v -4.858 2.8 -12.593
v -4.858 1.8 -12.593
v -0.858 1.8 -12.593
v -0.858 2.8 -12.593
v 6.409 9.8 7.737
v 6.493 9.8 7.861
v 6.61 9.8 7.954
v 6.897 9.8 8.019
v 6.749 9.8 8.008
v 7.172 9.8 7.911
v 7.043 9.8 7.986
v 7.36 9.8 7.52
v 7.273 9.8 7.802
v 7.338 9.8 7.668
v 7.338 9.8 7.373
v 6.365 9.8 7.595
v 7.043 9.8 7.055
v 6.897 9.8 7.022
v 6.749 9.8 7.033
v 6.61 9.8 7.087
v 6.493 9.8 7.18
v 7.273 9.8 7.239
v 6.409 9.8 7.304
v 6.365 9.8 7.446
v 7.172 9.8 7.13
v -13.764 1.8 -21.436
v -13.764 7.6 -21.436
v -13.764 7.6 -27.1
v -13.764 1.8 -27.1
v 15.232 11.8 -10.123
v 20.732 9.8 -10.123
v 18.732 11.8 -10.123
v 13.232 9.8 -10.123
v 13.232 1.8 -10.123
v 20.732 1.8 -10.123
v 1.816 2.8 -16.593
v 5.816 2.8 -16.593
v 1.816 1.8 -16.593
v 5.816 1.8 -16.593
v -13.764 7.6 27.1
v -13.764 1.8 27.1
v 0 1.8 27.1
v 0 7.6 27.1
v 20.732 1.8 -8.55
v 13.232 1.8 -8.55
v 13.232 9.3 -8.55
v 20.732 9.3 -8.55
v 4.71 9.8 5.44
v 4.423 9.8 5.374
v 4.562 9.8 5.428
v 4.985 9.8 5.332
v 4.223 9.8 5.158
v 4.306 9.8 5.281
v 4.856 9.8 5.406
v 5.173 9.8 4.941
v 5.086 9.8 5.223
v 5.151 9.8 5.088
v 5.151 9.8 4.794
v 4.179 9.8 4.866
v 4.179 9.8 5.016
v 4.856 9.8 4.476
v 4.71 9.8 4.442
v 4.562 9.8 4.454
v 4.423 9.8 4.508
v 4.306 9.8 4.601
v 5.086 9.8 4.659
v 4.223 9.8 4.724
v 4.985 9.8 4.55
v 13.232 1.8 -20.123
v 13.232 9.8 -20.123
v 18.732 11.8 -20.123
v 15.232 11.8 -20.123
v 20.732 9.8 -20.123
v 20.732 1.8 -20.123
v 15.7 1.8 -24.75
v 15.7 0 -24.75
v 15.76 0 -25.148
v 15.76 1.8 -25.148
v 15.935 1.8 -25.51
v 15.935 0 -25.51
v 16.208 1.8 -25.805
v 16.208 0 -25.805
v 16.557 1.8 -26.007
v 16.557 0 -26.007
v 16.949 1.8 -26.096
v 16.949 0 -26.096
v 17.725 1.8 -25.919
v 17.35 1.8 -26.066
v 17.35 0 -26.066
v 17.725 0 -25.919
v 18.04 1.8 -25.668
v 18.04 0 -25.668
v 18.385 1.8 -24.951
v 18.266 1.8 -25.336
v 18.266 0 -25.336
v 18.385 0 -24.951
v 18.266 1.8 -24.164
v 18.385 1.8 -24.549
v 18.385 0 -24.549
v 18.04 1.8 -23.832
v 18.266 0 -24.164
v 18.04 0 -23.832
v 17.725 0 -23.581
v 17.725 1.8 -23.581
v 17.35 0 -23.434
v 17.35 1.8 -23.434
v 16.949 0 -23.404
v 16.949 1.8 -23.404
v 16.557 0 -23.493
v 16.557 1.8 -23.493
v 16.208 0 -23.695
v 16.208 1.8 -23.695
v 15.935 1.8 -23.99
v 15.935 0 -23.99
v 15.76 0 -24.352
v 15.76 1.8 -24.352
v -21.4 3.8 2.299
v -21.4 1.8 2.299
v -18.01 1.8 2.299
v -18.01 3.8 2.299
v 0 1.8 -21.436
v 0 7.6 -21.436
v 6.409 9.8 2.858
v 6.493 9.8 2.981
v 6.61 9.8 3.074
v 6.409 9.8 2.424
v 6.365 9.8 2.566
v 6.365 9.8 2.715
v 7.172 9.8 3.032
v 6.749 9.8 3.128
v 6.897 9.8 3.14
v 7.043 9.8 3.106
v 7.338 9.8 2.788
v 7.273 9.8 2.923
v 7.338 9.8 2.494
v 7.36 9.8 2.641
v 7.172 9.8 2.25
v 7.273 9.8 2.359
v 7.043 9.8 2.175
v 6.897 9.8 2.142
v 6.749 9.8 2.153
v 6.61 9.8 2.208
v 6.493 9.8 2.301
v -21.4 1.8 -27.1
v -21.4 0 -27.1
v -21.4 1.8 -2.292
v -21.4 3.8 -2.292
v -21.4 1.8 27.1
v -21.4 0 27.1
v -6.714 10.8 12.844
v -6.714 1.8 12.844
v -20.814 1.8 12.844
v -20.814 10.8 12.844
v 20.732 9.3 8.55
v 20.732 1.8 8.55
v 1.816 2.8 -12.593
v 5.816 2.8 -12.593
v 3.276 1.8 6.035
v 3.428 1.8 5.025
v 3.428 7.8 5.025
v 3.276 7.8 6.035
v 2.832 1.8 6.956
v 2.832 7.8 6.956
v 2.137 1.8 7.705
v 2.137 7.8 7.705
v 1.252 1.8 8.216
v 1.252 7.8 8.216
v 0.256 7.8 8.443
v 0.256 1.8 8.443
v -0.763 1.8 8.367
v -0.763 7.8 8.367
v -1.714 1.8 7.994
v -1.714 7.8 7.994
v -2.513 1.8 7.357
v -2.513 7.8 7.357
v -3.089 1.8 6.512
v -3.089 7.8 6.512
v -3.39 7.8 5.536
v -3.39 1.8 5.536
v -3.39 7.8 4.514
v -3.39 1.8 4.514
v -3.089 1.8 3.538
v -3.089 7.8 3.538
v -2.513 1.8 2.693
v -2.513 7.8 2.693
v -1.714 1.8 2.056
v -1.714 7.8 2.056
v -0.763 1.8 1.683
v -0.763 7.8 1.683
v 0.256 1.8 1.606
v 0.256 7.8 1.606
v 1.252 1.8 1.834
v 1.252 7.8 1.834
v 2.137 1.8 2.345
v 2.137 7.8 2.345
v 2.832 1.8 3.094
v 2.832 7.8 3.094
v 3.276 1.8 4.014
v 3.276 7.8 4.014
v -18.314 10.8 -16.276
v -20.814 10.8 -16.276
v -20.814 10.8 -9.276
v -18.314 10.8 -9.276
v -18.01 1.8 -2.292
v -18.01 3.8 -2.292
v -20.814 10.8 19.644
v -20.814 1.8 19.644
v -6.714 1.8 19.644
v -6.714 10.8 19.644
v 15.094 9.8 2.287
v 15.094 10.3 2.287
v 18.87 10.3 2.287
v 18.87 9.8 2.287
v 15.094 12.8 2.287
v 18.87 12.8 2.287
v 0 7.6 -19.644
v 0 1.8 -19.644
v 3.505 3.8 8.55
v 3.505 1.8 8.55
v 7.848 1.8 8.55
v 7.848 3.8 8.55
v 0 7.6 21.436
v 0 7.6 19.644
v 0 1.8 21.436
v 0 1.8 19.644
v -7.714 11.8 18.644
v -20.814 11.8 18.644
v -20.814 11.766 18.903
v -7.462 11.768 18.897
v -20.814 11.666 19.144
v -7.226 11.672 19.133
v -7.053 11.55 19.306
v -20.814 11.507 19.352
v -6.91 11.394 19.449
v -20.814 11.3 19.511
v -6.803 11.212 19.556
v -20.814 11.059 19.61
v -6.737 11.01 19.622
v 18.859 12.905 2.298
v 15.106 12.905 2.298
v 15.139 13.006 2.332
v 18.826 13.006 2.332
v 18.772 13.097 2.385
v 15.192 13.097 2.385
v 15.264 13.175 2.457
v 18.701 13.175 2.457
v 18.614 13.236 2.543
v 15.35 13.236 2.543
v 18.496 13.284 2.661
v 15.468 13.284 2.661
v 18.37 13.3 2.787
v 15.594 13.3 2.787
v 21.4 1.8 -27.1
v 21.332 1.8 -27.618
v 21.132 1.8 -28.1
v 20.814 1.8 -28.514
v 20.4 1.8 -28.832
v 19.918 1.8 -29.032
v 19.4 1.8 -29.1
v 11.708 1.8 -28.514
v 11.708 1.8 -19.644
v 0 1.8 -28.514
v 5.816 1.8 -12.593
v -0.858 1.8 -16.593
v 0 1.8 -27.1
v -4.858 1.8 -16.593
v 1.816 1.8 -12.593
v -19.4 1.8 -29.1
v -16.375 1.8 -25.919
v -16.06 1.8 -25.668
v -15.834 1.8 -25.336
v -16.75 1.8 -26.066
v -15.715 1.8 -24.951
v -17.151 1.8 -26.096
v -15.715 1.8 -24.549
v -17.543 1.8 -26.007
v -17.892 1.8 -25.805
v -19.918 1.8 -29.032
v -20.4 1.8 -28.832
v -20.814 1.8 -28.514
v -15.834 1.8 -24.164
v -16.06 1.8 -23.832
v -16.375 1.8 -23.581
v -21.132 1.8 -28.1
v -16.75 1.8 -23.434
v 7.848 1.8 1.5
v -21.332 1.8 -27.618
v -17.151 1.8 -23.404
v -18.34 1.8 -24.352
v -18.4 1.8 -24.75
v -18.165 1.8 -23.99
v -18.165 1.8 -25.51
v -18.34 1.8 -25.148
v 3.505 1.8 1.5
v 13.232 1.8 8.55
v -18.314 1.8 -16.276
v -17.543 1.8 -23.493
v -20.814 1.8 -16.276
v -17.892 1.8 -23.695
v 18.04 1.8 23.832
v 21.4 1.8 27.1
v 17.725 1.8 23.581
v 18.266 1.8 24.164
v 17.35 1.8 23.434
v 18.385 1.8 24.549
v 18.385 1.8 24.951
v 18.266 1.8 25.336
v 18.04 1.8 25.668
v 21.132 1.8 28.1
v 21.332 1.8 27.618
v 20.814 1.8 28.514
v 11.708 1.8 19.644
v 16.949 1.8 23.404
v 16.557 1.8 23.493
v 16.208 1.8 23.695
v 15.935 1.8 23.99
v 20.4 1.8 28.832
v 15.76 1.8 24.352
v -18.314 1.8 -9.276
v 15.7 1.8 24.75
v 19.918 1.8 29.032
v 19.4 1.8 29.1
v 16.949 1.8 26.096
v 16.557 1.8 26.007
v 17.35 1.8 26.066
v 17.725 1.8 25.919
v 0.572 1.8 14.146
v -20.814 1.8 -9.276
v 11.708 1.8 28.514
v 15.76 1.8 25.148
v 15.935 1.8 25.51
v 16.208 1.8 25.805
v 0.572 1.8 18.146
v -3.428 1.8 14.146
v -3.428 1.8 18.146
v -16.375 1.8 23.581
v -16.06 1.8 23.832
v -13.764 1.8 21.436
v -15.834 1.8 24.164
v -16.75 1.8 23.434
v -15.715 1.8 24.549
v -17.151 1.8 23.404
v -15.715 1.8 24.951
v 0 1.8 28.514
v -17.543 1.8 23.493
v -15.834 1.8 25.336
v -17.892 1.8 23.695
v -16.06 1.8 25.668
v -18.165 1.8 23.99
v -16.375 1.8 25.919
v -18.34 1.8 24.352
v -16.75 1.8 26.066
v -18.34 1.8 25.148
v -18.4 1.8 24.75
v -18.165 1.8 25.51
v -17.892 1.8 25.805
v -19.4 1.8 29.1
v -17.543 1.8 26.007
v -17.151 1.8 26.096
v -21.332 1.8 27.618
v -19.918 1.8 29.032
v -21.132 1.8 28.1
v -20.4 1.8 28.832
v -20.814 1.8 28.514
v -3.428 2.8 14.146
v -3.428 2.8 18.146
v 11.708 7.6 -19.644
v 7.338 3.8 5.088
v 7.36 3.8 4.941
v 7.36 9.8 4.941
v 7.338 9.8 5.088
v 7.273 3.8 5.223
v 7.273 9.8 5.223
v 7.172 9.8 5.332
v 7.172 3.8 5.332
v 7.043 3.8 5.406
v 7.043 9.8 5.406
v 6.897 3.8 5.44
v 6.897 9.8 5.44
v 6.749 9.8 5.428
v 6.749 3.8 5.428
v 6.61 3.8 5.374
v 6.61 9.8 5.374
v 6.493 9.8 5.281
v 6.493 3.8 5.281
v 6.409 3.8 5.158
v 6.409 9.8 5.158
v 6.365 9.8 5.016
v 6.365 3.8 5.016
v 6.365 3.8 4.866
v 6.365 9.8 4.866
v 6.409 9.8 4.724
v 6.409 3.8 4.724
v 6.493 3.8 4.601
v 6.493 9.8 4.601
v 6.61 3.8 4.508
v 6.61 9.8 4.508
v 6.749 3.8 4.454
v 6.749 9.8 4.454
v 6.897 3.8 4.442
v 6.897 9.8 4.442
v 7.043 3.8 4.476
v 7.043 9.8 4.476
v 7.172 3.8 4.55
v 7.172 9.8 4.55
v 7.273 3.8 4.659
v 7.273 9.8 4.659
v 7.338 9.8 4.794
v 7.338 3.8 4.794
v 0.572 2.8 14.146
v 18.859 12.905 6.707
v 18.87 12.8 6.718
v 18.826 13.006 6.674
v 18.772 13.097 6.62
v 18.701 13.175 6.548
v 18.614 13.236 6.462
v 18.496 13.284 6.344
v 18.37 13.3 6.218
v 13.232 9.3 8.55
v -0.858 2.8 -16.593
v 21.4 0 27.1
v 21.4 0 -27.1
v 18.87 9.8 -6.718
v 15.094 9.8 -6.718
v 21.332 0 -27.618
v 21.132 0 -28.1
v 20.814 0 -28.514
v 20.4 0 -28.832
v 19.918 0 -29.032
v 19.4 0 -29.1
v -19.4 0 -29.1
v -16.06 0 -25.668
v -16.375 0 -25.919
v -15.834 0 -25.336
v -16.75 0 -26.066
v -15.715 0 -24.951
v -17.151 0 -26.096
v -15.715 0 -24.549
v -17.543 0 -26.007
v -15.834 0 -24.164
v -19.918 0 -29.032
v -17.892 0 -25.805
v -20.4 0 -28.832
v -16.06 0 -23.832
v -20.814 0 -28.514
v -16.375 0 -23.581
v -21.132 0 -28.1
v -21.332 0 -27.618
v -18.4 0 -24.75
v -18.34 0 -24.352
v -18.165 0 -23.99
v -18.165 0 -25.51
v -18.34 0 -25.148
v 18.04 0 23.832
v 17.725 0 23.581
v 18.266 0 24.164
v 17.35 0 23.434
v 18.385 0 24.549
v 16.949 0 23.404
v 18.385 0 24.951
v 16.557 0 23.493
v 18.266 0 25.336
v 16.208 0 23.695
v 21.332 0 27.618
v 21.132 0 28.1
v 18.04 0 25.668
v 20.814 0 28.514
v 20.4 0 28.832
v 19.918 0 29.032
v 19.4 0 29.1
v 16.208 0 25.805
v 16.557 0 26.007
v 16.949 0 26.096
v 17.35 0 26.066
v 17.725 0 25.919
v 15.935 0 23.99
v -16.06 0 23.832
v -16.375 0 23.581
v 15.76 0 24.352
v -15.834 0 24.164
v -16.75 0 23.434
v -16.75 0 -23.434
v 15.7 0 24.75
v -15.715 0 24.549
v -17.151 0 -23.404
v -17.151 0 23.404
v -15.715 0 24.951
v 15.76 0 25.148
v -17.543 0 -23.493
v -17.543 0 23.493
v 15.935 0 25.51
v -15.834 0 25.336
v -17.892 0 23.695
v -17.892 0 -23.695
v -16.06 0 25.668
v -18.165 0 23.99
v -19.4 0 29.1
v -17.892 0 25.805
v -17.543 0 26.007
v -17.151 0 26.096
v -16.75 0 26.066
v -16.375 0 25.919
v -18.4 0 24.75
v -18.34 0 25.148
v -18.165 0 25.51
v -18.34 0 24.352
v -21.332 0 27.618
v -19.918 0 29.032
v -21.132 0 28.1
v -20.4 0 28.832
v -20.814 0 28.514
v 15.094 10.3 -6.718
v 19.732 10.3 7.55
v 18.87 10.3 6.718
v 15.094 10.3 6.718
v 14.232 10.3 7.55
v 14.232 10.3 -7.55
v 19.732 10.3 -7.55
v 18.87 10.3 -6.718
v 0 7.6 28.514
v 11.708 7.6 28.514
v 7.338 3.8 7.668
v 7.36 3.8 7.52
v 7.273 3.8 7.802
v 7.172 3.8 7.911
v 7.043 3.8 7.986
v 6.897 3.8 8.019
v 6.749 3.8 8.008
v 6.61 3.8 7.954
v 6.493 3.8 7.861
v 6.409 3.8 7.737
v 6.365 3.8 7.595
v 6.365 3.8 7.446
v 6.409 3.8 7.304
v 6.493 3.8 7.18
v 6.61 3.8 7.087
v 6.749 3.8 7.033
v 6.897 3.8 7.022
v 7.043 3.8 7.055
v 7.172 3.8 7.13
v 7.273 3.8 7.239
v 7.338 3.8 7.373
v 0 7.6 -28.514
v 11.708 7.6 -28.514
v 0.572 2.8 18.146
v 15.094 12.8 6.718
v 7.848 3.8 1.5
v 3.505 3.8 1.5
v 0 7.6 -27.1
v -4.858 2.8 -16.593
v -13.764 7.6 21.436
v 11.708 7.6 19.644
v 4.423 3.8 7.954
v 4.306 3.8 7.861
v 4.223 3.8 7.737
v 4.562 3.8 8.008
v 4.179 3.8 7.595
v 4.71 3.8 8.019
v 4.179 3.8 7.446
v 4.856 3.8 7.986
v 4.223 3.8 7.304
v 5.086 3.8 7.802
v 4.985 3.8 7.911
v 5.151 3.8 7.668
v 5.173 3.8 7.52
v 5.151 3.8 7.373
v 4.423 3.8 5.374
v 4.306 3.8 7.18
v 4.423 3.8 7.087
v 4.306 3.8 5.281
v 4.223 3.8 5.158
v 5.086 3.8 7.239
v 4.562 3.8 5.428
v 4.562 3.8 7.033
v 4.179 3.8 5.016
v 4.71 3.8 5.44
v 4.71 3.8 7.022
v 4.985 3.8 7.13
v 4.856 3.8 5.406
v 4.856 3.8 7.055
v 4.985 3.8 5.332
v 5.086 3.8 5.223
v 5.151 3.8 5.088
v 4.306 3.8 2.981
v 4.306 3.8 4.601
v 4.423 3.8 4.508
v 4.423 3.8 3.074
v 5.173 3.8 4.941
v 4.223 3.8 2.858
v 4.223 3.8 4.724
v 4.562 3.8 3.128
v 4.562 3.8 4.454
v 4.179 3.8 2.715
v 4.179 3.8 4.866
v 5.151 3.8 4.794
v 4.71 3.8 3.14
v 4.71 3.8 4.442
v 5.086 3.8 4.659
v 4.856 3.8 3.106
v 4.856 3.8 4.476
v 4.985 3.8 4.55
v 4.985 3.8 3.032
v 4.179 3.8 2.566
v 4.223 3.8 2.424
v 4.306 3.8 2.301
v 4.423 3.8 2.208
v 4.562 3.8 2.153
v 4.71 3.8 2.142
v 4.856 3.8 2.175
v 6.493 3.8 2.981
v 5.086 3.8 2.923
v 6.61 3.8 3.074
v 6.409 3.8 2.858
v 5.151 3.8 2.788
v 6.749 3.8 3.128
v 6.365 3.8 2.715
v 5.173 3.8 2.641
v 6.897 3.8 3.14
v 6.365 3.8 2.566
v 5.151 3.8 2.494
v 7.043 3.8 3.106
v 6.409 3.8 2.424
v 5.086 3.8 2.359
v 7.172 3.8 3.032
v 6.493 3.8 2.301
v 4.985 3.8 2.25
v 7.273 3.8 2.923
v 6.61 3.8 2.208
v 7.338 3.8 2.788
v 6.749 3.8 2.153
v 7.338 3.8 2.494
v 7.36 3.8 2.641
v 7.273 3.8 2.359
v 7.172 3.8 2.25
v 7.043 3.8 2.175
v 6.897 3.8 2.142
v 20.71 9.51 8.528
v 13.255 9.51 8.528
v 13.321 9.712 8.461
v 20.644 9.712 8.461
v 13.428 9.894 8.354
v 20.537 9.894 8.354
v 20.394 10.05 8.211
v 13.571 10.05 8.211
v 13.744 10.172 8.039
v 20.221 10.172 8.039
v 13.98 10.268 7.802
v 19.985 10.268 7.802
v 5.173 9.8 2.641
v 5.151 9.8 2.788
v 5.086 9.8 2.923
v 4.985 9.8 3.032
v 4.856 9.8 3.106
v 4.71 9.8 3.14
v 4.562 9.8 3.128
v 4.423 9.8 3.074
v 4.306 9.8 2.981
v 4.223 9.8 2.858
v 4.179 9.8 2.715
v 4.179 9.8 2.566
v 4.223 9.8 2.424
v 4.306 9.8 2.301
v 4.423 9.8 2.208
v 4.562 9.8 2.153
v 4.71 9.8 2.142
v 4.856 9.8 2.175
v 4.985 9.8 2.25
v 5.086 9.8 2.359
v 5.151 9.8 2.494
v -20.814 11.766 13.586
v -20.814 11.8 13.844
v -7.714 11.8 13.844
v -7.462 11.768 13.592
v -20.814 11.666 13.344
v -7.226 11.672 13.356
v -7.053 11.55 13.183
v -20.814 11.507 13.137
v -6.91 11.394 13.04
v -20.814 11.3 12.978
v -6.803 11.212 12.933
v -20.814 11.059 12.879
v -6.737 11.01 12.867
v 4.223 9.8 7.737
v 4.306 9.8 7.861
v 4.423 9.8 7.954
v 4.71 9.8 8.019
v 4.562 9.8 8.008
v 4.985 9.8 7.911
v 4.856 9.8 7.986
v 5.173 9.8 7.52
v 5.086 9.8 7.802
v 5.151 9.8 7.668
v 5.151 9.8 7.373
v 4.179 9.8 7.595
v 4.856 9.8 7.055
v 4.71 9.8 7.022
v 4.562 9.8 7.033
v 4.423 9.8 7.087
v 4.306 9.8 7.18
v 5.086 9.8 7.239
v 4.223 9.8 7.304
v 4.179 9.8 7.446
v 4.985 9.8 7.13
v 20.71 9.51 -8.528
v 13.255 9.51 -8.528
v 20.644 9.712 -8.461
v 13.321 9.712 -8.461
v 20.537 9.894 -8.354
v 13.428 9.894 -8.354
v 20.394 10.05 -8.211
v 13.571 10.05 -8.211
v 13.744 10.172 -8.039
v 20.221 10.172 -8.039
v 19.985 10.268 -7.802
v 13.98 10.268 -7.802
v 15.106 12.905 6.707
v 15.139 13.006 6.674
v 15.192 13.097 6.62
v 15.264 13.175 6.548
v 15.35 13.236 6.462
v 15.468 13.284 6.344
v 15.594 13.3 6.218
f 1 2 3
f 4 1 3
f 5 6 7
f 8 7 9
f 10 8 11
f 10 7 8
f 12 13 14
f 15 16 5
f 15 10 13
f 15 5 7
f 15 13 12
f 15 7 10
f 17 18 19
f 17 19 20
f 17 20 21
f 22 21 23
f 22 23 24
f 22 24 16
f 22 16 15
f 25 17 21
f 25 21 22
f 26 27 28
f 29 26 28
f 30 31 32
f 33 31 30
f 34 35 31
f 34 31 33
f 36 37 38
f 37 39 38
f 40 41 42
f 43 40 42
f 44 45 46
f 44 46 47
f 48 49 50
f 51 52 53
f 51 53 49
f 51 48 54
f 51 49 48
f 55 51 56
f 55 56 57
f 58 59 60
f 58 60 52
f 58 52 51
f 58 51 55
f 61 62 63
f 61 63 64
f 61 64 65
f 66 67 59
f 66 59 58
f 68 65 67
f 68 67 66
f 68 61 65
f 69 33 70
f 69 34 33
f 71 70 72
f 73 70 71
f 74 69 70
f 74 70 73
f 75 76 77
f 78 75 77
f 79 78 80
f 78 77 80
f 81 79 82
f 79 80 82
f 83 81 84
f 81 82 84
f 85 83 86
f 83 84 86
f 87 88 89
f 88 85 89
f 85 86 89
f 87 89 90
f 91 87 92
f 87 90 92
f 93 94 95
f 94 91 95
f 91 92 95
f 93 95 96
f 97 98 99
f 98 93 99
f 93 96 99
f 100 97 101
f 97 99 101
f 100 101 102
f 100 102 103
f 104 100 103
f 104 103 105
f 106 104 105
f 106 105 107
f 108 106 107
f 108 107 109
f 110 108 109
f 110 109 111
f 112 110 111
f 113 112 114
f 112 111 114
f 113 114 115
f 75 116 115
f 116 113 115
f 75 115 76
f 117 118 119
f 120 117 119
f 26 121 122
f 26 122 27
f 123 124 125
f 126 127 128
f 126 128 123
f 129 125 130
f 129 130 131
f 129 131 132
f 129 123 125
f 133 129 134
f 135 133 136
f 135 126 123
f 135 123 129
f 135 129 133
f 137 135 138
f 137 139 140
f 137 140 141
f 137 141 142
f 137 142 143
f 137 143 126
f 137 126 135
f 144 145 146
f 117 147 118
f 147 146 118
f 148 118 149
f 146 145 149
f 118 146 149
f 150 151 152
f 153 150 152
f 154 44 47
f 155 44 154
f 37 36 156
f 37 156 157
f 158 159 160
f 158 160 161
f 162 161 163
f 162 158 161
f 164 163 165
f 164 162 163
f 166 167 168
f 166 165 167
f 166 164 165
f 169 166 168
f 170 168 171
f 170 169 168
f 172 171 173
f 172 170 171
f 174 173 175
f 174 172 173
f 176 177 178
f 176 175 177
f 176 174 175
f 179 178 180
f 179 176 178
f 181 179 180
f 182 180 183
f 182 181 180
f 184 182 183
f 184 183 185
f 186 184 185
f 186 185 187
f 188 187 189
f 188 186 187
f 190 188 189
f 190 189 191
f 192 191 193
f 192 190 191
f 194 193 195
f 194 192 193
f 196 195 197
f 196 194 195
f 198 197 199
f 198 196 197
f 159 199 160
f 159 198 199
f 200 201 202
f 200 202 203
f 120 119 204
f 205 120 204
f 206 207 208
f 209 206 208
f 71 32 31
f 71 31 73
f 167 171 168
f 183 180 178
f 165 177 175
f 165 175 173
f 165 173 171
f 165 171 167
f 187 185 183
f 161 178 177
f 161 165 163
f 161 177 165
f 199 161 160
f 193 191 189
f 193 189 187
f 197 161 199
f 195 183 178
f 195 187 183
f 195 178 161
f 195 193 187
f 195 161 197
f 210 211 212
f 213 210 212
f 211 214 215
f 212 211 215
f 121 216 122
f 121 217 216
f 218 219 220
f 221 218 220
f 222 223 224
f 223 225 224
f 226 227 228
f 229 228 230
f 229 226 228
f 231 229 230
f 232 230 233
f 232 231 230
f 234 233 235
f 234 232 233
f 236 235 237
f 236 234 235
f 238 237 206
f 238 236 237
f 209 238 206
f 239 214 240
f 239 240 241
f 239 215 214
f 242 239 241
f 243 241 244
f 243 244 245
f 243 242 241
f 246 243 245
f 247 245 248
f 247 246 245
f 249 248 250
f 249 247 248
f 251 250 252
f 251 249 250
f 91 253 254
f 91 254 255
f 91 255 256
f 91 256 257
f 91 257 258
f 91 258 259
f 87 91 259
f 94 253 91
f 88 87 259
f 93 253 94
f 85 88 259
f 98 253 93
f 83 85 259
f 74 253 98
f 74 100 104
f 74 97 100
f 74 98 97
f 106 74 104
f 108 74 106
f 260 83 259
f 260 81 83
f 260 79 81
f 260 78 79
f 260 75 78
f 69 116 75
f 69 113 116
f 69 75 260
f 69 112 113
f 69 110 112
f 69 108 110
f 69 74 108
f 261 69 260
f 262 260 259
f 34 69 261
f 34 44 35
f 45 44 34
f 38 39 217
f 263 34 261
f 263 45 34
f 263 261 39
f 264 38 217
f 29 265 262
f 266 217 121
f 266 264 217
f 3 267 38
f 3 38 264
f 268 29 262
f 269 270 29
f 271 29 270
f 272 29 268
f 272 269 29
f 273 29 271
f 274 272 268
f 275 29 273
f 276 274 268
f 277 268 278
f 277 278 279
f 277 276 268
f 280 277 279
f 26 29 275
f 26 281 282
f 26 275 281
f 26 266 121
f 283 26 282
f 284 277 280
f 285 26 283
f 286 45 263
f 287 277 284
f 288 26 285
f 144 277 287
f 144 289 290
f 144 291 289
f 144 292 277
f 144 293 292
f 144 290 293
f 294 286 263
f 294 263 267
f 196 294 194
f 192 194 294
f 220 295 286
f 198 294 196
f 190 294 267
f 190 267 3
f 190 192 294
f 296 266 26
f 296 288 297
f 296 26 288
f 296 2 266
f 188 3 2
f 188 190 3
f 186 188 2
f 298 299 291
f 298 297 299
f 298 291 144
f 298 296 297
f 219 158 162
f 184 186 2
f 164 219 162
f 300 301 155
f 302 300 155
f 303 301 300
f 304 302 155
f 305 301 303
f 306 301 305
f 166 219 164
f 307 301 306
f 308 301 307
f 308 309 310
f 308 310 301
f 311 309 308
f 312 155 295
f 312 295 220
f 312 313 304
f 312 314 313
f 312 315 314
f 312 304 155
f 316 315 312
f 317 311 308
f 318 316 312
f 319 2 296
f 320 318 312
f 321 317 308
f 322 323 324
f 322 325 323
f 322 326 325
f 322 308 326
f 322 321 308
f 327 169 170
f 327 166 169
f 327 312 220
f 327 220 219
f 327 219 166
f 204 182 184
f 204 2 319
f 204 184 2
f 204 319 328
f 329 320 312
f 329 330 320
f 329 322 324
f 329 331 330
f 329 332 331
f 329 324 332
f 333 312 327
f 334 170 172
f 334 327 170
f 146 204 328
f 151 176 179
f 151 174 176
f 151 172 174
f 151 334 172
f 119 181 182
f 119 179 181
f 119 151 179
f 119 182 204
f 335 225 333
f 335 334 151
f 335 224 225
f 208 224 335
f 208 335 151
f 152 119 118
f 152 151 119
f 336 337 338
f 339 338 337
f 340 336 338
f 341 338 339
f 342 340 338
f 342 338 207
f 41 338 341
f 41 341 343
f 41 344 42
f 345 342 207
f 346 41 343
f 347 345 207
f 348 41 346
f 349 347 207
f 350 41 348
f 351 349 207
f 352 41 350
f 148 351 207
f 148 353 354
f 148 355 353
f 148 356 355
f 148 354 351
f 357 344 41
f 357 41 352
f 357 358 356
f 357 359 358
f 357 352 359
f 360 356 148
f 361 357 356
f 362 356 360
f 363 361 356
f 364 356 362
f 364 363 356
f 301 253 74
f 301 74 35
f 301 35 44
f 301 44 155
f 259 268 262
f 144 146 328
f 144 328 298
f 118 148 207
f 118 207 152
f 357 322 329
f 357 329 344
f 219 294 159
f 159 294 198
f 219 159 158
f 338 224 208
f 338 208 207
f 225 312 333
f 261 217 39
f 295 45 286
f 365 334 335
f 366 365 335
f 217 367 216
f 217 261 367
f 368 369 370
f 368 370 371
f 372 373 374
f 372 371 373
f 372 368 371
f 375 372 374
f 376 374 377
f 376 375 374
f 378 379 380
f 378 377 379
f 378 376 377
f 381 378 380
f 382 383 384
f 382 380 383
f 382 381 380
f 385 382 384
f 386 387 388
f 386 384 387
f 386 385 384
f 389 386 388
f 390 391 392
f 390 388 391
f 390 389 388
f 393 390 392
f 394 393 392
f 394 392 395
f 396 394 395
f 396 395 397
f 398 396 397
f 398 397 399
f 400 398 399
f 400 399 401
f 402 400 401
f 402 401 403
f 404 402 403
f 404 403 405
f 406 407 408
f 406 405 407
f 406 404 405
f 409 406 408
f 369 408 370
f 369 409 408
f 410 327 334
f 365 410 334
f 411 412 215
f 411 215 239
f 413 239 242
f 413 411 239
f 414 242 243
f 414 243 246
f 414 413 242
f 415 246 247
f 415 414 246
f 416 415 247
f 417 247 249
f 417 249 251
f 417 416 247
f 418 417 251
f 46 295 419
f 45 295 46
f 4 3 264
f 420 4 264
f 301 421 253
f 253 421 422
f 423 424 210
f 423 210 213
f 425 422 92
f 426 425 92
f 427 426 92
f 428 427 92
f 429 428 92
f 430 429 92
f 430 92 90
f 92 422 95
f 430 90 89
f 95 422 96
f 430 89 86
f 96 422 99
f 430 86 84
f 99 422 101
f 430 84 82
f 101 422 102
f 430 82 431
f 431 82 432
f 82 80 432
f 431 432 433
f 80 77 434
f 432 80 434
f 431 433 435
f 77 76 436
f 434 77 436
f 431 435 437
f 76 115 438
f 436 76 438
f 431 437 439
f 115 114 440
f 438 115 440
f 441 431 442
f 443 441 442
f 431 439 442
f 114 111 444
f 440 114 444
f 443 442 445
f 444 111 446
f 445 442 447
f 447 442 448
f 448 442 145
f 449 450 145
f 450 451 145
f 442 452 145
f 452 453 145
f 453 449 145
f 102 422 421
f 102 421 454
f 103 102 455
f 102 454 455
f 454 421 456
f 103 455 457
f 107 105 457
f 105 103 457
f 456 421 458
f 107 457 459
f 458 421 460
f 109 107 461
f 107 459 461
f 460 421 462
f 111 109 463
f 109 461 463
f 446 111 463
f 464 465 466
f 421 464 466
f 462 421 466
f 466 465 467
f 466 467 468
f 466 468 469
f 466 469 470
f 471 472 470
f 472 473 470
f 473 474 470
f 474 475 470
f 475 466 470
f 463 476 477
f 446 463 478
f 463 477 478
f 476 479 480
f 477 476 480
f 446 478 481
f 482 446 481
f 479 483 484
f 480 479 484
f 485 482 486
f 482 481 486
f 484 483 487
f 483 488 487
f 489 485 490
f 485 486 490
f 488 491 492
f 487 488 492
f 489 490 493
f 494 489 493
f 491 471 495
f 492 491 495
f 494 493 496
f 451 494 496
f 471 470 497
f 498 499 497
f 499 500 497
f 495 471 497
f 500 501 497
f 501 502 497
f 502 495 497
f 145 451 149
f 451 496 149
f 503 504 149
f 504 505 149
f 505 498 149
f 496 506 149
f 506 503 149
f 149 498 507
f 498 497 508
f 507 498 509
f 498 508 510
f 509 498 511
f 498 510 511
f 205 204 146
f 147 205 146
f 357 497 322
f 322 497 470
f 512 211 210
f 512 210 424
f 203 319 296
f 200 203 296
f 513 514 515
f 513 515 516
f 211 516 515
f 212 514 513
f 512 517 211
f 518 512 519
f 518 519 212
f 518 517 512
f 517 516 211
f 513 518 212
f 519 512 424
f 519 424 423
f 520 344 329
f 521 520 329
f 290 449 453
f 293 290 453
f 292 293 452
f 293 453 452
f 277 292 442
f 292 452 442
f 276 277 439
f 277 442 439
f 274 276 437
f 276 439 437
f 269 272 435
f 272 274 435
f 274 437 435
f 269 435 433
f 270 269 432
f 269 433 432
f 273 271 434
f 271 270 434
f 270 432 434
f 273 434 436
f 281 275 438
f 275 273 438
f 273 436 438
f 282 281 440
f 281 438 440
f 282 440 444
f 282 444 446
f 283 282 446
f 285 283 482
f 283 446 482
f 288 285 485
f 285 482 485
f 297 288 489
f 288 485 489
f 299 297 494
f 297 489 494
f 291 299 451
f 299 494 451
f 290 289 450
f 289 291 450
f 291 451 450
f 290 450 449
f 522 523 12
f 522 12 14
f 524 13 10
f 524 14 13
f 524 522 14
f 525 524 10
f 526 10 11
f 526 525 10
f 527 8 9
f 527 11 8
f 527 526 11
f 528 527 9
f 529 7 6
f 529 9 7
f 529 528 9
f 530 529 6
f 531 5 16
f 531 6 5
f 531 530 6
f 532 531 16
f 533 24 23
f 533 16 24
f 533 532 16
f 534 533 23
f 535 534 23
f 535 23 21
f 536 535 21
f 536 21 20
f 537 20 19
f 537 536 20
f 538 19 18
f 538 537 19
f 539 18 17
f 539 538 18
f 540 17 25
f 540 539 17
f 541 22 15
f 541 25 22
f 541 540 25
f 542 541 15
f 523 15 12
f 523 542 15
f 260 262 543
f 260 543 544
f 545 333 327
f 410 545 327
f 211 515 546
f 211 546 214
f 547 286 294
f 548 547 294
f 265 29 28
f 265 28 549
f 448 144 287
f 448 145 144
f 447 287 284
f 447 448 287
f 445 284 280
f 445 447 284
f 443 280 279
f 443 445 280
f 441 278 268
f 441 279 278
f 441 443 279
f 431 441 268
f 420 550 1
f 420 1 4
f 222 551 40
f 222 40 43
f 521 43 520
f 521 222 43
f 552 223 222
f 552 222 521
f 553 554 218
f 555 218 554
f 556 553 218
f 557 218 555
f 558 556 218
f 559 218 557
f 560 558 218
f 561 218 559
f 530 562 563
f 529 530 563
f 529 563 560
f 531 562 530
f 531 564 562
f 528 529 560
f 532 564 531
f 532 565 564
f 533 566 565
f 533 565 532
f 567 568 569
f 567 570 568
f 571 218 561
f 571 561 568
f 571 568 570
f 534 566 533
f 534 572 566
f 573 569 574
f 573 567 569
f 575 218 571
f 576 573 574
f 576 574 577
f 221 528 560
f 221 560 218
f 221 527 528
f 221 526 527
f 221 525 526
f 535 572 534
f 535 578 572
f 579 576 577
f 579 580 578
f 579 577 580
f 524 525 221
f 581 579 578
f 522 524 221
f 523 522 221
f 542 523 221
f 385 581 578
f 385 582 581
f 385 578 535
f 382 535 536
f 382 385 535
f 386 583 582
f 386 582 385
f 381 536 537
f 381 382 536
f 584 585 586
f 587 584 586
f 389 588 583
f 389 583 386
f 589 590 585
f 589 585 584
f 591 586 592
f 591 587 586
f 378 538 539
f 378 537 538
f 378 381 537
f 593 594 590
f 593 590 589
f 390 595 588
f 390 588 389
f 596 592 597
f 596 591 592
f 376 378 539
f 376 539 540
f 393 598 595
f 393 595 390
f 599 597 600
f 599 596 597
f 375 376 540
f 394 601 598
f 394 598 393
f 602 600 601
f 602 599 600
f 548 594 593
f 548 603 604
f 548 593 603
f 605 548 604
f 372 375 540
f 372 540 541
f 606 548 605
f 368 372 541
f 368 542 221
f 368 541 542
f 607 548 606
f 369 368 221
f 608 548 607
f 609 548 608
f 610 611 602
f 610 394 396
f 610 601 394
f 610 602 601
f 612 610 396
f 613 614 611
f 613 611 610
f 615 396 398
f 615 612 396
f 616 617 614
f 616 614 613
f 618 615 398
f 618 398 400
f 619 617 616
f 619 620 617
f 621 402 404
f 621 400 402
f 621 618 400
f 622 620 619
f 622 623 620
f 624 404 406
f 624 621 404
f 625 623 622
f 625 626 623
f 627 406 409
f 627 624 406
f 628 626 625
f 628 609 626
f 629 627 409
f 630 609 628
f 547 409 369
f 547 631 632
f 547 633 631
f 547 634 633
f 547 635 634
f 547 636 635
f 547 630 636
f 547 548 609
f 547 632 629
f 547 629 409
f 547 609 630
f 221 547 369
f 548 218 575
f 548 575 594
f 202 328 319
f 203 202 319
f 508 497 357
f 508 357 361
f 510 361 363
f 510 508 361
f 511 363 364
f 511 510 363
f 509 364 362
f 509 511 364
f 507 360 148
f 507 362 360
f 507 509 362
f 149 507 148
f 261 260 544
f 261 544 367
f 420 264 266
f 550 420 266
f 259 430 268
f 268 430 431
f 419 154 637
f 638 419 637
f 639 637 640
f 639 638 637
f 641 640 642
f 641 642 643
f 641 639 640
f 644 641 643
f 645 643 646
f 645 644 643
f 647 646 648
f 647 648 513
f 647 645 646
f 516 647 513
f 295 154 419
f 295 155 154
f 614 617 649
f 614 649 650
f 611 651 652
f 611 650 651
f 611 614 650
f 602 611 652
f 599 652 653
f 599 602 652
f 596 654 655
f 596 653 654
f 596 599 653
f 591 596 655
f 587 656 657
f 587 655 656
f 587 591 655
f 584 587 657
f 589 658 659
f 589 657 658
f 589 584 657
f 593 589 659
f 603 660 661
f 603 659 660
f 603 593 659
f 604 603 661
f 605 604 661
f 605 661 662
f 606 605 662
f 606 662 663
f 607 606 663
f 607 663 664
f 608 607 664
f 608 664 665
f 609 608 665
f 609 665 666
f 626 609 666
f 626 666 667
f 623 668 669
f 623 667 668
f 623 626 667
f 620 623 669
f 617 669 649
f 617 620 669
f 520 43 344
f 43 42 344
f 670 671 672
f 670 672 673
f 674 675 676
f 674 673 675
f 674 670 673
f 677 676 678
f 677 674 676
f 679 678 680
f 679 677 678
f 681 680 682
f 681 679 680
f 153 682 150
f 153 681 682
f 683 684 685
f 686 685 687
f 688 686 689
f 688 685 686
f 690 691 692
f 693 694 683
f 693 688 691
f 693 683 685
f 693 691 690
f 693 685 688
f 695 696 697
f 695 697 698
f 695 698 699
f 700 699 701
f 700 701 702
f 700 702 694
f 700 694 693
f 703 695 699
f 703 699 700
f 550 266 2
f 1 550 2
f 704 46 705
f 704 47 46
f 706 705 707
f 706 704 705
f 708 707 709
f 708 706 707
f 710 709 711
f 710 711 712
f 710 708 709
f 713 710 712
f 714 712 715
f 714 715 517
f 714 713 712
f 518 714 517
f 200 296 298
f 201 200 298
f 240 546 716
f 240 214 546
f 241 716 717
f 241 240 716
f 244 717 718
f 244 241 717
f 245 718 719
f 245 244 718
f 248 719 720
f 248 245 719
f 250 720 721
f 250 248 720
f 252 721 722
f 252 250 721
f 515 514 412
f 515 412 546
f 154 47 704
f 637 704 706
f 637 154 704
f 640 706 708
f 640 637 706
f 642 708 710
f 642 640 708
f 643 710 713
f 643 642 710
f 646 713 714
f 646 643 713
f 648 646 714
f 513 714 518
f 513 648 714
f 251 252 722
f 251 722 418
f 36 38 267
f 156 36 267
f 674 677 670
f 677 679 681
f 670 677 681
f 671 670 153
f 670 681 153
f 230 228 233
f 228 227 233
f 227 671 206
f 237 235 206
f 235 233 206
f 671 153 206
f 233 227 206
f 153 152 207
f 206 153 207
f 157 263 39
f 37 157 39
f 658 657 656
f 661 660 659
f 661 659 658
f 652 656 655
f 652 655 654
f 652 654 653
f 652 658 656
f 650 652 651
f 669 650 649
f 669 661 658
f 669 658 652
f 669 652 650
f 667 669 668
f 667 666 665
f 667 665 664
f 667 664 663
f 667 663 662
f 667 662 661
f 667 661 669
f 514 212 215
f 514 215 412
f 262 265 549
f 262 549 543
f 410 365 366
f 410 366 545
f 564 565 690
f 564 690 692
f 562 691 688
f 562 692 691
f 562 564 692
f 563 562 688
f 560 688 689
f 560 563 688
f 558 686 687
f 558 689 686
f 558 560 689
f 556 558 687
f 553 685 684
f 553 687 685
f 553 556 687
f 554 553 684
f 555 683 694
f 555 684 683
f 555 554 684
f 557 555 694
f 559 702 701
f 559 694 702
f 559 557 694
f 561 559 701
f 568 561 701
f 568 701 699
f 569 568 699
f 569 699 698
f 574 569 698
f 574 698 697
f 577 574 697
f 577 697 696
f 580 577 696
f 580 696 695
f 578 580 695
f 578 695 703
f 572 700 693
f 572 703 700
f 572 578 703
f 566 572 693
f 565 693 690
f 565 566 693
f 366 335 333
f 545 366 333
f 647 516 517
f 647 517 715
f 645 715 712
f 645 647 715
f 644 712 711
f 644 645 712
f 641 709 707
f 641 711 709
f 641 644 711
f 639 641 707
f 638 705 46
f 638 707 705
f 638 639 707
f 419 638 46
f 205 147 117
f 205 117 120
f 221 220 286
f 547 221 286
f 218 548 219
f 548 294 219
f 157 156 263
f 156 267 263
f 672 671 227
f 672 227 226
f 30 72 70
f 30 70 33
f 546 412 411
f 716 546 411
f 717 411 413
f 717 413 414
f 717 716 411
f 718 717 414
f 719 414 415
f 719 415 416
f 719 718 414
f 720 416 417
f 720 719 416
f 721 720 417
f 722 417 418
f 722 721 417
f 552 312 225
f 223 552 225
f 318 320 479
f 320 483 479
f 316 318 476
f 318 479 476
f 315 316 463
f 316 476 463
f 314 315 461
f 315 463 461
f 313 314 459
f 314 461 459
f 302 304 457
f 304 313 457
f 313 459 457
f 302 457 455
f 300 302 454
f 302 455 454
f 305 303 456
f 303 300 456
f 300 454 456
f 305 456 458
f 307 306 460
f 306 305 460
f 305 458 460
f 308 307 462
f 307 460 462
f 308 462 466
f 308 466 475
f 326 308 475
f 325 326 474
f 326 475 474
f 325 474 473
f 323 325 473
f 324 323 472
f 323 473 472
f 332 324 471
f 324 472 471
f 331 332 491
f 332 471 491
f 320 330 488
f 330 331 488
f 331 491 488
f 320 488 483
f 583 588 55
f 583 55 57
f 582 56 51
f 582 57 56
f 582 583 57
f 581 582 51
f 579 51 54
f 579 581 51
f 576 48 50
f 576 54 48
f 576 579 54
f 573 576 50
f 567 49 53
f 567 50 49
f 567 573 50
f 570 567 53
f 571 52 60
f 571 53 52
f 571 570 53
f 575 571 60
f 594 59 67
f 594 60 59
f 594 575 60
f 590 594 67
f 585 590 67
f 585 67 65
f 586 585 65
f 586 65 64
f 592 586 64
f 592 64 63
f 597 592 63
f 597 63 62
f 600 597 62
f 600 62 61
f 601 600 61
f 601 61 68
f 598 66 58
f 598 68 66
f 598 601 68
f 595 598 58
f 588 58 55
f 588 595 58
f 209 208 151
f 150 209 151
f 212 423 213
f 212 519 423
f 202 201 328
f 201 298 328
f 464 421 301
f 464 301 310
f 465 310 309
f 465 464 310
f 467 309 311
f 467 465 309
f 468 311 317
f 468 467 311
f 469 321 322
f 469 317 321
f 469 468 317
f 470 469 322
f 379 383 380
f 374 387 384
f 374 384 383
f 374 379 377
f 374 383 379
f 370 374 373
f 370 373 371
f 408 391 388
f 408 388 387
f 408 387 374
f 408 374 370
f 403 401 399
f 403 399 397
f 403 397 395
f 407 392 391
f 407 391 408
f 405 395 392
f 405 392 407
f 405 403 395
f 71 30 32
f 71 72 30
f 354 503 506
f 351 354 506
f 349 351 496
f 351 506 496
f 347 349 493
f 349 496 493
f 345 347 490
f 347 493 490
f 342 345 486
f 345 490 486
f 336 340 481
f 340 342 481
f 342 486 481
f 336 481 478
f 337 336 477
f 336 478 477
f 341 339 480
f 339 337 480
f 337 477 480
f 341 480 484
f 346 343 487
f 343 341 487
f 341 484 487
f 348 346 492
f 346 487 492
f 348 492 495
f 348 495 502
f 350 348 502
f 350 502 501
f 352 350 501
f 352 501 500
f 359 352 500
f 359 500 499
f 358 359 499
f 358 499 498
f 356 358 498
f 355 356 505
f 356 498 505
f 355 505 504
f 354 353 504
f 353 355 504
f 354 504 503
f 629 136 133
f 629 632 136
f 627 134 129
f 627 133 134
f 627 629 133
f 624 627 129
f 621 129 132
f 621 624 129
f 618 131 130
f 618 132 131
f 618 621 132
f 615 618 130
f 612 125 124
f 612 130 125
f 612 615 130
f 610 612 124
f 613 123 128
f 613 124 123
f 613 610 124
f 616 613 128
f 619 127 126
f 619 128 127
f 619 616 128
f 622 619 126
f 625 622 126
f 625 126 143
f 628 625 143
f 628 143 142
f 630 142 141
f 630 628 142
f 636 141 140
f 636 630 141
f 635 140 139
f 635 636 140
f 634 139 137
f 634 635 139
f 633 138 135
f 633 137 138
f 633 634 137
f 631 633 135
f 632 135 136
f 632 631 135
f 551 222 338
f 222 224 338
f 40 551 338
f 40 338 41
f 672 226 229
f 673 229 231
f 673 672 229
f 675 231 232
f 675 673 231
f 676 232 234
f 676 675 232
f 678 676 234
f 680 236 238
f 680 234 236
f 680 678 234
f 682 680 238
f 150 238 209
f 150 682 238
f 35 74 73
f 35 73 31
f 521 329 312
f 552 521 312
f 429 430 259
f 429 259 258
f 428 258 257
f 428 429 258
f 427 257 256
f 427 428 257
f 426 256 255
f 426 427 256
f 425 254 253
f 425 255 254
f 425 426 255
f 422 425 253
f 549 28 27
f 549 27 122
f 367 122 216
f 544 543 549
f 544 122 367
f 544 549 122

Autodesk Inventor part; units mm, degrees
ref_plane "YZ Plane" through (0, 0, 0) normal (1, 0, 0) x (0, 1, 0)
ref_plane "XZ Plane" through (0, 0, 0) normal (0, 1, 0) x (-1, 0, 0)
ref_plane "XY Plane" through (0, 0, 0) normal (0, 0, 1) x (1, 0, 0)
sketch "Esboço1" plane through (0, 0, 0) normal (0, 1, 0) x (-1, 0, 0)
  line L0 (-19.4, -29.1) -> (19.4, -29.1)
  line L1 (21.4, -27.1) -> (21.4, 27.1)
  line L2 (19.4, 29.1) -> (-19.4, 29.1)
  line L3 (-21.4, 27.1) -> (-21.4, -27.1)
  line L4 (-21.4, -29.1) -> (21.4, 29.1) construction
  line L5 (21.4, -29.1) -> (-21.4, 29.1) construction
  circle A0 centre (17.05, 24.75) radius 1.35
  circle A1 centre (-17.05, 24.75) radius 1.35
  circle A2 centre (17.05, -24.75) radius 1.35
  circle A3 centre (-17.05, -24.75) radius 1.35
  arc A4 (21.4, 27.1) -> (19.4, 29.1) centre (19.4, 27.1) ccw
  arc A5 (-19.4, 29.1) -> (-21.4, 27.1) centre (-19.4, 27.1) ccw
  arc A6 (19.4, -29.1) -> (21.4, -27.1) centre (19.4, -27.1) ccw
  arc A7 (-21.4, -27.1) -> (-19.4, -29.1) centre (-19.4, -27.1) ccw
  point P0 (0, 0)
  dimension "d0" = 42.8
  dimension "d1" = 58.2
  dimension "d2" = 2.7
  dimension "d3" = 3
  dimension "d4" = 3
  dimension "d5" = 2.7
  dimension "d6" = 3
  dimension "d7" = 3
  dimension "d8" = 2
extrude "Extrusão1" add sketch "Esboço1" along normal blind 1.8
sketch "Esboço2" plane through (0, 1.8, 0) normal (0, 1, 0) x (1, 0, 0)
  line L0 (-21.4, 27.1) -> (-21.4, -27.1) projected
  arc A0 (-21.4, -27.1) -> (-19.4, -29.1) centre (-19.4, -27.1) ccw projected
  arc A1 (-19.4, 29.1) -> (-21.4, 27.1) centre (-19.4, 27.1) ccw projected
  line L1 (19.4, 29.1) -> (-19.4, 29.1) projected
  line L2 (-19.4, -29.1) -> (19.4, -29.1) projected
  arc A2 (19.4, -29.1) -> (21.4, -27.1) centre (19.4, -27.1) ccw projected
  line L3 (21.4, -27.1) -> (21.4, 27.1) projected
  arc A3 (21.4, 27.1) -> (19.4, 29.1) centre (19.4, 27.1) ccw projected
  line L4 (20.7322, -8.55) -> (13.2322, -8.55)
  line L5 (13.2322, -8.55) -> (13.2322, 8.55)
  line L6 (13.2322, 8.55) -> (20.7322, 8.55)
  line L7 (20.7322, 8.55) -> (20.7322, -8.55)
  line L8 (20.7322, -8.55) -> (13.2322, 8.55) construction
  line L9 (13.2322, -8.55) -> (20.7322, 8.55) construction
  line L10 (20.7322, 10.1228) -> (13.2322, 10.1228)
  line L11 (13.2322, 10.1228) -> (13.2322, 20.1228)
  line L12 (13.2322, 20.1228) -> (20.7322, 20.1228)
  line L13 (20.7322, 20.1228) -> (20.7322, 10.1228)
  line L14 (-20.8142, -19.6445) -> (-6.7142, -19.6445)
  line L15 (-6.7142, -19.6445) -> (-6.7142, -12.8445)
  line L16 (-6.7142, -12.8445) -> (-20.8142, -12.8445)
  line L17 (-20.8142, -12.8445) -> (-20.8142, -19.6445)
  line L18 (-28.189, 0) -> (33.4078, 0)
  line L19 (-21.4, -2.2988) -> (-18.0103, -2.2988)
  line L20 (-18.0103, -2.2988) -> (-18.0103, 2.2923)
  line L21 (-18.0103, 2.2923) -> (-21.4, 2.2923)
  line L22 (-21.4, 2.2923) -> (-21.4, -2.2988)
  line L23 (-13.7642, -27.1) -> (0, -27.1)
  line L24 (0, -21.4359) -> (-13.7642, -21.4359)
  line L25 (-13.7642, -21.4359) -> (-13.7642, -27.1)
  line L26 (0, -28.5142) -> (11.7075, -28.5142)
  line L27 (11.7075, -28.5142) -> (11.7075, -19.6445)
  line L28 (11.7075, -19.6445) -> (0, -19.6445)
  line L29 (0, -19.6445) -> (0, -21.4359)
  line L30 (0, -27.1) -> (0, -28.5142)
  line L31 (-13.7642, 27.1) -> (0, 27.1)
  line L32 (0, 21.4359) -> (-13.7642, 21.4359)
  line L33 (-13.7642, 21.4359) -> (-13.7642, 27.1)
  line L34 (0, 28.5142) -> (11.7075, 28.5142)
  line L35 (11.7075, 28.5142) -> (11.7075, 19.6445)
  line L36 (11.7075, 19.6445) -> (0, 19.6445)
  line L37 (0, 19.6445) -> (0, 21.4359)
  line L38 (0, 27.1) -> (0, 28.5142)
  line L39 (3.5052, -8.55) -> (7.8476, -8.55)
  line L40 (7.8476, -8.55) -> (7.8476, -1.4997)
  line L41 (7.8476, -1.4997) -> (3.5052, -1.4997)
  line L42 (3.5052, -1.4997) -> (3.5052, -8.55)
  circle A4 centre (0, -5.0249) radius 3.428
  line L43 (-3.428, -18.1455) -> (0.572, -18.1455)
  line L44 (0.572, -18.1455) -> (0.572, -14.1455)
  line L45 (0.572, -14.1455) -> (-3.428, -14.1455)
  line L46 (-3.428, -14.1455) -> (-3.428, -18.1455)
  line L47 (-4.8578, 12.5931) -> (-0.8578, 12.5931)
  line L48 (-0.8578, 12.5931) -> (-0.8578, 16.5931)
  line L49 (-0.8578, 16.5931) -> (-4.8578, 16.5931)
  line L50 (-4.8578, 16.5931) -> (-4.8578, 12.5931)
  line L51 (1.8165, 12.5931) -> (5.8165, 12.5931)
  line L52 (5.8165, 12.5931) -> (5.8165, 16.5931)
  line L53 (5.8165, 16.5931) -> (1.8165, 16.5931)
  line L54 (1.8165, 16.5931) -> (1.8165, 12.5931)
  line L55 (-20.8142, 9.2758) -> (-18.3142, 9.2758)
  line L56 (-18.3142, 9.2758) -> (-18.3142, 16.2758)
  line L57 (-18.3142, 16.2758) -> (-20.8142, 16.2758)
  line L58 (-20.8142, 16.2758) -> (-20.8142, 9.2758)
  point P0 (0, 0)
  point P1 (16.9822, 0)
  dimension "d11" = 7.5
  dimension "d12" = 17.1
  dimension "d13" = 7.5
  dimension "d14" = 10
  dimension "d15" = 14.1
  dimension "d16" = 6.8
  dimension "d17" = 4
  dimension "d18" = 4
  dimension "d19" = 4
  dimension "d20" = 4
  dimension "d21" = 4
  dimension "d22" = 4
  dimension "d23" = 2.5
  dimension "d24" = 7
extrude "Extrusão2" add sketch "Esboço2" along normal blind 8.5 contours L18 L7 L4 L5 | L5 L6 L7 L18
extrude "Extrusão3" add sketch "Esboço2" along normal blind 10 contours L10 L11 L12 L13 | L17 L16 L15 L14
extrude "Extrusão4" add sketch "Esboço2" along normal blind 5.8 contours L25 L24 L29 L28 L27 L26 L30 L23 | L31 L38 L34 L35 L36 L37 L32 L33
extrude "Extrusão5" add sketch "Esboço2" along normal blind 1 contours L46 L45 L44 L43 | L50 L49 L48 L47 | L54 L53 L52 L51
extrude "Extrusão6" add sketch "Esboço2" along normal blind 2 contours L21 L20 L18 L0 | L18 L20 L19 L0 | L42 L41 L40 L39
extrude "Extrusão7" add sketch "Esboço2" along normal blind 9 contours L58 L57 L56 L55
extrude "Extrusão8" add sketch "Esboço2" along normal blind 6 contours A4
chamfer "Chanfro1" distance 2 angle 45 2 edges at (20.7322, 11.8, -15.1228) (13.2322, 11.8, -15.1228)
fillet "Arredondamento1" radius 1 4 edges at (20.7322, 10.3, 0) (13.2322, 10.3, 0) (16.9822, 10.3, 8.55) (16.9822, 10.3, -8.55)
fillet "Arredondamento2" radius 1 3 edges at (-13.7642, 11.8, 19.6445) (-13.7642, 11.8, 12.8445) (-6.7142, 11.8, 16.2445)
sketch "Esboço3" plane through (0, 3.8, 0) normal (0, 1, 0) x (1, 0, 0)
  line L0 (7.8476, -1.4997) -> (3.5052, -1.4997) projected
  line L1 (3.5052, -1.4997) -> (3.5052, -8.55) projected
  line L2 (7.8476, -8.55) -> (7.8476, -1.4997) projected
  line L3 (3.5052, -8.55) -> (7.8476, -8.55) projected
  line L4 (3.5052, -1.4997) -> (7.8476, -1.4997)
  line L5 (7.8476, -1.4997) -> (7.8476, -3.7821)
  line L6 (7.8476, -3.7821) -> (3.5052, -3.7821)
  line L7 (3.5052, -3.7821) -> (3.5052, -1.4997)
  line L8 (3.5052, -3.7821) -> (7.8476, -3.7821)
  line L9 (7.8476, -3.7821) -> (7.8476, -6.0999)
  line L10 (7.8476, -6.0999) -> (3.5052, -6.0999)
  line L11 (3.5052, -6.0999) -> (3.5052, -3.7821)
  line L12 (5.6764, -1.4997) -> (5.6764, -8.55)
  circle A0 centre (4.673, -2.6409) radius 0.5
  circle A1 centre (6.8599, -2.6409) radius 0.5
  circle A2 centre (4.673, -4.941) radius 0.5
  circle A3 centre (6.8599, -4.941) radius 0.5
  circle A4 centre (4.673, -7.5205) radius 0.5
  circle A5 centre (6.8599, -7.5205) radius 0.5
  point P0 (0, 0)
  dimension "d44" = 1
  dimension "d45" = 1
  dimension "d46" = 1
  dimension "d47" = 1
  dimension "d48" = 1
  dimension "d49" = 1
extrude "Extrusão9" add sketch "Esboço3" along normal blind 6 contours A0 | A1 | A2 | A3 | A4 | A5
sketch "Esboço4" plane through (0, 10.3, 0) normal (0, 1, 0) x (1, 0, 0)
  line L0 (14.2322, 7.55) -> (19.7322, 7.55) projected
  line L1 (14.2322, -7.55) -> (14.2322, 7.55) projected
  line L2 (19.7322, 7.55) -> (19.7322, -7.55) projected
  line L3 (19.7322, -7.55) -> (14.2322, -7.55) projected
  line L4 (18.8699, -6.7178) -> (15.0945, -6.7178)
  line L5 (15.0945, -6.7178) -> (15.0945, 6.7178)
  line L6 (15.0945, 6.7178) -> (18.8699, 6.7178)
  line L7 (18.8699, 6.7178) -> (18.8699, -6.7178)
  line L8 (18.8699, -6.7178) -> (15.0945, 6.7178) construction
  line L9 (15.0945, -6.7178) -> (18.8699, 6.7178) construction
  line L10 (15.0945, -2.2873) -> (18.8699, -2.2873)
  line L11 (18.8699, -2.2873) -> (18.8699, -6.7178)
  line L12 (18.8699, -6.7178) -> (15.0945, -6.7178)
  line L13 (15.0945, -6.7178) -> (15.0945, -2.2873)
  point P0 (0, 0)
  point P1 (16.9822, 0)
extrude "Extrusão10" add sketch "Esboço4" along normal blind 3 contours L4 L5 L10 L7
extrude "Extrusão11" cut sketch "Esboço4" against normal blind 0.5 contours L10 L5 L6 L7
fillet "Arredondamento3" radius 0.5 4 edges at (16.9822, 13.3, 6.7178) (18.8699, 13.3, 4.5025) (16.9822, 13.3, 2.2873) (15.0945, 13.3, 4.5025)
properties part number "SERIAL_BUS_SERVO_CONTROLLER"
